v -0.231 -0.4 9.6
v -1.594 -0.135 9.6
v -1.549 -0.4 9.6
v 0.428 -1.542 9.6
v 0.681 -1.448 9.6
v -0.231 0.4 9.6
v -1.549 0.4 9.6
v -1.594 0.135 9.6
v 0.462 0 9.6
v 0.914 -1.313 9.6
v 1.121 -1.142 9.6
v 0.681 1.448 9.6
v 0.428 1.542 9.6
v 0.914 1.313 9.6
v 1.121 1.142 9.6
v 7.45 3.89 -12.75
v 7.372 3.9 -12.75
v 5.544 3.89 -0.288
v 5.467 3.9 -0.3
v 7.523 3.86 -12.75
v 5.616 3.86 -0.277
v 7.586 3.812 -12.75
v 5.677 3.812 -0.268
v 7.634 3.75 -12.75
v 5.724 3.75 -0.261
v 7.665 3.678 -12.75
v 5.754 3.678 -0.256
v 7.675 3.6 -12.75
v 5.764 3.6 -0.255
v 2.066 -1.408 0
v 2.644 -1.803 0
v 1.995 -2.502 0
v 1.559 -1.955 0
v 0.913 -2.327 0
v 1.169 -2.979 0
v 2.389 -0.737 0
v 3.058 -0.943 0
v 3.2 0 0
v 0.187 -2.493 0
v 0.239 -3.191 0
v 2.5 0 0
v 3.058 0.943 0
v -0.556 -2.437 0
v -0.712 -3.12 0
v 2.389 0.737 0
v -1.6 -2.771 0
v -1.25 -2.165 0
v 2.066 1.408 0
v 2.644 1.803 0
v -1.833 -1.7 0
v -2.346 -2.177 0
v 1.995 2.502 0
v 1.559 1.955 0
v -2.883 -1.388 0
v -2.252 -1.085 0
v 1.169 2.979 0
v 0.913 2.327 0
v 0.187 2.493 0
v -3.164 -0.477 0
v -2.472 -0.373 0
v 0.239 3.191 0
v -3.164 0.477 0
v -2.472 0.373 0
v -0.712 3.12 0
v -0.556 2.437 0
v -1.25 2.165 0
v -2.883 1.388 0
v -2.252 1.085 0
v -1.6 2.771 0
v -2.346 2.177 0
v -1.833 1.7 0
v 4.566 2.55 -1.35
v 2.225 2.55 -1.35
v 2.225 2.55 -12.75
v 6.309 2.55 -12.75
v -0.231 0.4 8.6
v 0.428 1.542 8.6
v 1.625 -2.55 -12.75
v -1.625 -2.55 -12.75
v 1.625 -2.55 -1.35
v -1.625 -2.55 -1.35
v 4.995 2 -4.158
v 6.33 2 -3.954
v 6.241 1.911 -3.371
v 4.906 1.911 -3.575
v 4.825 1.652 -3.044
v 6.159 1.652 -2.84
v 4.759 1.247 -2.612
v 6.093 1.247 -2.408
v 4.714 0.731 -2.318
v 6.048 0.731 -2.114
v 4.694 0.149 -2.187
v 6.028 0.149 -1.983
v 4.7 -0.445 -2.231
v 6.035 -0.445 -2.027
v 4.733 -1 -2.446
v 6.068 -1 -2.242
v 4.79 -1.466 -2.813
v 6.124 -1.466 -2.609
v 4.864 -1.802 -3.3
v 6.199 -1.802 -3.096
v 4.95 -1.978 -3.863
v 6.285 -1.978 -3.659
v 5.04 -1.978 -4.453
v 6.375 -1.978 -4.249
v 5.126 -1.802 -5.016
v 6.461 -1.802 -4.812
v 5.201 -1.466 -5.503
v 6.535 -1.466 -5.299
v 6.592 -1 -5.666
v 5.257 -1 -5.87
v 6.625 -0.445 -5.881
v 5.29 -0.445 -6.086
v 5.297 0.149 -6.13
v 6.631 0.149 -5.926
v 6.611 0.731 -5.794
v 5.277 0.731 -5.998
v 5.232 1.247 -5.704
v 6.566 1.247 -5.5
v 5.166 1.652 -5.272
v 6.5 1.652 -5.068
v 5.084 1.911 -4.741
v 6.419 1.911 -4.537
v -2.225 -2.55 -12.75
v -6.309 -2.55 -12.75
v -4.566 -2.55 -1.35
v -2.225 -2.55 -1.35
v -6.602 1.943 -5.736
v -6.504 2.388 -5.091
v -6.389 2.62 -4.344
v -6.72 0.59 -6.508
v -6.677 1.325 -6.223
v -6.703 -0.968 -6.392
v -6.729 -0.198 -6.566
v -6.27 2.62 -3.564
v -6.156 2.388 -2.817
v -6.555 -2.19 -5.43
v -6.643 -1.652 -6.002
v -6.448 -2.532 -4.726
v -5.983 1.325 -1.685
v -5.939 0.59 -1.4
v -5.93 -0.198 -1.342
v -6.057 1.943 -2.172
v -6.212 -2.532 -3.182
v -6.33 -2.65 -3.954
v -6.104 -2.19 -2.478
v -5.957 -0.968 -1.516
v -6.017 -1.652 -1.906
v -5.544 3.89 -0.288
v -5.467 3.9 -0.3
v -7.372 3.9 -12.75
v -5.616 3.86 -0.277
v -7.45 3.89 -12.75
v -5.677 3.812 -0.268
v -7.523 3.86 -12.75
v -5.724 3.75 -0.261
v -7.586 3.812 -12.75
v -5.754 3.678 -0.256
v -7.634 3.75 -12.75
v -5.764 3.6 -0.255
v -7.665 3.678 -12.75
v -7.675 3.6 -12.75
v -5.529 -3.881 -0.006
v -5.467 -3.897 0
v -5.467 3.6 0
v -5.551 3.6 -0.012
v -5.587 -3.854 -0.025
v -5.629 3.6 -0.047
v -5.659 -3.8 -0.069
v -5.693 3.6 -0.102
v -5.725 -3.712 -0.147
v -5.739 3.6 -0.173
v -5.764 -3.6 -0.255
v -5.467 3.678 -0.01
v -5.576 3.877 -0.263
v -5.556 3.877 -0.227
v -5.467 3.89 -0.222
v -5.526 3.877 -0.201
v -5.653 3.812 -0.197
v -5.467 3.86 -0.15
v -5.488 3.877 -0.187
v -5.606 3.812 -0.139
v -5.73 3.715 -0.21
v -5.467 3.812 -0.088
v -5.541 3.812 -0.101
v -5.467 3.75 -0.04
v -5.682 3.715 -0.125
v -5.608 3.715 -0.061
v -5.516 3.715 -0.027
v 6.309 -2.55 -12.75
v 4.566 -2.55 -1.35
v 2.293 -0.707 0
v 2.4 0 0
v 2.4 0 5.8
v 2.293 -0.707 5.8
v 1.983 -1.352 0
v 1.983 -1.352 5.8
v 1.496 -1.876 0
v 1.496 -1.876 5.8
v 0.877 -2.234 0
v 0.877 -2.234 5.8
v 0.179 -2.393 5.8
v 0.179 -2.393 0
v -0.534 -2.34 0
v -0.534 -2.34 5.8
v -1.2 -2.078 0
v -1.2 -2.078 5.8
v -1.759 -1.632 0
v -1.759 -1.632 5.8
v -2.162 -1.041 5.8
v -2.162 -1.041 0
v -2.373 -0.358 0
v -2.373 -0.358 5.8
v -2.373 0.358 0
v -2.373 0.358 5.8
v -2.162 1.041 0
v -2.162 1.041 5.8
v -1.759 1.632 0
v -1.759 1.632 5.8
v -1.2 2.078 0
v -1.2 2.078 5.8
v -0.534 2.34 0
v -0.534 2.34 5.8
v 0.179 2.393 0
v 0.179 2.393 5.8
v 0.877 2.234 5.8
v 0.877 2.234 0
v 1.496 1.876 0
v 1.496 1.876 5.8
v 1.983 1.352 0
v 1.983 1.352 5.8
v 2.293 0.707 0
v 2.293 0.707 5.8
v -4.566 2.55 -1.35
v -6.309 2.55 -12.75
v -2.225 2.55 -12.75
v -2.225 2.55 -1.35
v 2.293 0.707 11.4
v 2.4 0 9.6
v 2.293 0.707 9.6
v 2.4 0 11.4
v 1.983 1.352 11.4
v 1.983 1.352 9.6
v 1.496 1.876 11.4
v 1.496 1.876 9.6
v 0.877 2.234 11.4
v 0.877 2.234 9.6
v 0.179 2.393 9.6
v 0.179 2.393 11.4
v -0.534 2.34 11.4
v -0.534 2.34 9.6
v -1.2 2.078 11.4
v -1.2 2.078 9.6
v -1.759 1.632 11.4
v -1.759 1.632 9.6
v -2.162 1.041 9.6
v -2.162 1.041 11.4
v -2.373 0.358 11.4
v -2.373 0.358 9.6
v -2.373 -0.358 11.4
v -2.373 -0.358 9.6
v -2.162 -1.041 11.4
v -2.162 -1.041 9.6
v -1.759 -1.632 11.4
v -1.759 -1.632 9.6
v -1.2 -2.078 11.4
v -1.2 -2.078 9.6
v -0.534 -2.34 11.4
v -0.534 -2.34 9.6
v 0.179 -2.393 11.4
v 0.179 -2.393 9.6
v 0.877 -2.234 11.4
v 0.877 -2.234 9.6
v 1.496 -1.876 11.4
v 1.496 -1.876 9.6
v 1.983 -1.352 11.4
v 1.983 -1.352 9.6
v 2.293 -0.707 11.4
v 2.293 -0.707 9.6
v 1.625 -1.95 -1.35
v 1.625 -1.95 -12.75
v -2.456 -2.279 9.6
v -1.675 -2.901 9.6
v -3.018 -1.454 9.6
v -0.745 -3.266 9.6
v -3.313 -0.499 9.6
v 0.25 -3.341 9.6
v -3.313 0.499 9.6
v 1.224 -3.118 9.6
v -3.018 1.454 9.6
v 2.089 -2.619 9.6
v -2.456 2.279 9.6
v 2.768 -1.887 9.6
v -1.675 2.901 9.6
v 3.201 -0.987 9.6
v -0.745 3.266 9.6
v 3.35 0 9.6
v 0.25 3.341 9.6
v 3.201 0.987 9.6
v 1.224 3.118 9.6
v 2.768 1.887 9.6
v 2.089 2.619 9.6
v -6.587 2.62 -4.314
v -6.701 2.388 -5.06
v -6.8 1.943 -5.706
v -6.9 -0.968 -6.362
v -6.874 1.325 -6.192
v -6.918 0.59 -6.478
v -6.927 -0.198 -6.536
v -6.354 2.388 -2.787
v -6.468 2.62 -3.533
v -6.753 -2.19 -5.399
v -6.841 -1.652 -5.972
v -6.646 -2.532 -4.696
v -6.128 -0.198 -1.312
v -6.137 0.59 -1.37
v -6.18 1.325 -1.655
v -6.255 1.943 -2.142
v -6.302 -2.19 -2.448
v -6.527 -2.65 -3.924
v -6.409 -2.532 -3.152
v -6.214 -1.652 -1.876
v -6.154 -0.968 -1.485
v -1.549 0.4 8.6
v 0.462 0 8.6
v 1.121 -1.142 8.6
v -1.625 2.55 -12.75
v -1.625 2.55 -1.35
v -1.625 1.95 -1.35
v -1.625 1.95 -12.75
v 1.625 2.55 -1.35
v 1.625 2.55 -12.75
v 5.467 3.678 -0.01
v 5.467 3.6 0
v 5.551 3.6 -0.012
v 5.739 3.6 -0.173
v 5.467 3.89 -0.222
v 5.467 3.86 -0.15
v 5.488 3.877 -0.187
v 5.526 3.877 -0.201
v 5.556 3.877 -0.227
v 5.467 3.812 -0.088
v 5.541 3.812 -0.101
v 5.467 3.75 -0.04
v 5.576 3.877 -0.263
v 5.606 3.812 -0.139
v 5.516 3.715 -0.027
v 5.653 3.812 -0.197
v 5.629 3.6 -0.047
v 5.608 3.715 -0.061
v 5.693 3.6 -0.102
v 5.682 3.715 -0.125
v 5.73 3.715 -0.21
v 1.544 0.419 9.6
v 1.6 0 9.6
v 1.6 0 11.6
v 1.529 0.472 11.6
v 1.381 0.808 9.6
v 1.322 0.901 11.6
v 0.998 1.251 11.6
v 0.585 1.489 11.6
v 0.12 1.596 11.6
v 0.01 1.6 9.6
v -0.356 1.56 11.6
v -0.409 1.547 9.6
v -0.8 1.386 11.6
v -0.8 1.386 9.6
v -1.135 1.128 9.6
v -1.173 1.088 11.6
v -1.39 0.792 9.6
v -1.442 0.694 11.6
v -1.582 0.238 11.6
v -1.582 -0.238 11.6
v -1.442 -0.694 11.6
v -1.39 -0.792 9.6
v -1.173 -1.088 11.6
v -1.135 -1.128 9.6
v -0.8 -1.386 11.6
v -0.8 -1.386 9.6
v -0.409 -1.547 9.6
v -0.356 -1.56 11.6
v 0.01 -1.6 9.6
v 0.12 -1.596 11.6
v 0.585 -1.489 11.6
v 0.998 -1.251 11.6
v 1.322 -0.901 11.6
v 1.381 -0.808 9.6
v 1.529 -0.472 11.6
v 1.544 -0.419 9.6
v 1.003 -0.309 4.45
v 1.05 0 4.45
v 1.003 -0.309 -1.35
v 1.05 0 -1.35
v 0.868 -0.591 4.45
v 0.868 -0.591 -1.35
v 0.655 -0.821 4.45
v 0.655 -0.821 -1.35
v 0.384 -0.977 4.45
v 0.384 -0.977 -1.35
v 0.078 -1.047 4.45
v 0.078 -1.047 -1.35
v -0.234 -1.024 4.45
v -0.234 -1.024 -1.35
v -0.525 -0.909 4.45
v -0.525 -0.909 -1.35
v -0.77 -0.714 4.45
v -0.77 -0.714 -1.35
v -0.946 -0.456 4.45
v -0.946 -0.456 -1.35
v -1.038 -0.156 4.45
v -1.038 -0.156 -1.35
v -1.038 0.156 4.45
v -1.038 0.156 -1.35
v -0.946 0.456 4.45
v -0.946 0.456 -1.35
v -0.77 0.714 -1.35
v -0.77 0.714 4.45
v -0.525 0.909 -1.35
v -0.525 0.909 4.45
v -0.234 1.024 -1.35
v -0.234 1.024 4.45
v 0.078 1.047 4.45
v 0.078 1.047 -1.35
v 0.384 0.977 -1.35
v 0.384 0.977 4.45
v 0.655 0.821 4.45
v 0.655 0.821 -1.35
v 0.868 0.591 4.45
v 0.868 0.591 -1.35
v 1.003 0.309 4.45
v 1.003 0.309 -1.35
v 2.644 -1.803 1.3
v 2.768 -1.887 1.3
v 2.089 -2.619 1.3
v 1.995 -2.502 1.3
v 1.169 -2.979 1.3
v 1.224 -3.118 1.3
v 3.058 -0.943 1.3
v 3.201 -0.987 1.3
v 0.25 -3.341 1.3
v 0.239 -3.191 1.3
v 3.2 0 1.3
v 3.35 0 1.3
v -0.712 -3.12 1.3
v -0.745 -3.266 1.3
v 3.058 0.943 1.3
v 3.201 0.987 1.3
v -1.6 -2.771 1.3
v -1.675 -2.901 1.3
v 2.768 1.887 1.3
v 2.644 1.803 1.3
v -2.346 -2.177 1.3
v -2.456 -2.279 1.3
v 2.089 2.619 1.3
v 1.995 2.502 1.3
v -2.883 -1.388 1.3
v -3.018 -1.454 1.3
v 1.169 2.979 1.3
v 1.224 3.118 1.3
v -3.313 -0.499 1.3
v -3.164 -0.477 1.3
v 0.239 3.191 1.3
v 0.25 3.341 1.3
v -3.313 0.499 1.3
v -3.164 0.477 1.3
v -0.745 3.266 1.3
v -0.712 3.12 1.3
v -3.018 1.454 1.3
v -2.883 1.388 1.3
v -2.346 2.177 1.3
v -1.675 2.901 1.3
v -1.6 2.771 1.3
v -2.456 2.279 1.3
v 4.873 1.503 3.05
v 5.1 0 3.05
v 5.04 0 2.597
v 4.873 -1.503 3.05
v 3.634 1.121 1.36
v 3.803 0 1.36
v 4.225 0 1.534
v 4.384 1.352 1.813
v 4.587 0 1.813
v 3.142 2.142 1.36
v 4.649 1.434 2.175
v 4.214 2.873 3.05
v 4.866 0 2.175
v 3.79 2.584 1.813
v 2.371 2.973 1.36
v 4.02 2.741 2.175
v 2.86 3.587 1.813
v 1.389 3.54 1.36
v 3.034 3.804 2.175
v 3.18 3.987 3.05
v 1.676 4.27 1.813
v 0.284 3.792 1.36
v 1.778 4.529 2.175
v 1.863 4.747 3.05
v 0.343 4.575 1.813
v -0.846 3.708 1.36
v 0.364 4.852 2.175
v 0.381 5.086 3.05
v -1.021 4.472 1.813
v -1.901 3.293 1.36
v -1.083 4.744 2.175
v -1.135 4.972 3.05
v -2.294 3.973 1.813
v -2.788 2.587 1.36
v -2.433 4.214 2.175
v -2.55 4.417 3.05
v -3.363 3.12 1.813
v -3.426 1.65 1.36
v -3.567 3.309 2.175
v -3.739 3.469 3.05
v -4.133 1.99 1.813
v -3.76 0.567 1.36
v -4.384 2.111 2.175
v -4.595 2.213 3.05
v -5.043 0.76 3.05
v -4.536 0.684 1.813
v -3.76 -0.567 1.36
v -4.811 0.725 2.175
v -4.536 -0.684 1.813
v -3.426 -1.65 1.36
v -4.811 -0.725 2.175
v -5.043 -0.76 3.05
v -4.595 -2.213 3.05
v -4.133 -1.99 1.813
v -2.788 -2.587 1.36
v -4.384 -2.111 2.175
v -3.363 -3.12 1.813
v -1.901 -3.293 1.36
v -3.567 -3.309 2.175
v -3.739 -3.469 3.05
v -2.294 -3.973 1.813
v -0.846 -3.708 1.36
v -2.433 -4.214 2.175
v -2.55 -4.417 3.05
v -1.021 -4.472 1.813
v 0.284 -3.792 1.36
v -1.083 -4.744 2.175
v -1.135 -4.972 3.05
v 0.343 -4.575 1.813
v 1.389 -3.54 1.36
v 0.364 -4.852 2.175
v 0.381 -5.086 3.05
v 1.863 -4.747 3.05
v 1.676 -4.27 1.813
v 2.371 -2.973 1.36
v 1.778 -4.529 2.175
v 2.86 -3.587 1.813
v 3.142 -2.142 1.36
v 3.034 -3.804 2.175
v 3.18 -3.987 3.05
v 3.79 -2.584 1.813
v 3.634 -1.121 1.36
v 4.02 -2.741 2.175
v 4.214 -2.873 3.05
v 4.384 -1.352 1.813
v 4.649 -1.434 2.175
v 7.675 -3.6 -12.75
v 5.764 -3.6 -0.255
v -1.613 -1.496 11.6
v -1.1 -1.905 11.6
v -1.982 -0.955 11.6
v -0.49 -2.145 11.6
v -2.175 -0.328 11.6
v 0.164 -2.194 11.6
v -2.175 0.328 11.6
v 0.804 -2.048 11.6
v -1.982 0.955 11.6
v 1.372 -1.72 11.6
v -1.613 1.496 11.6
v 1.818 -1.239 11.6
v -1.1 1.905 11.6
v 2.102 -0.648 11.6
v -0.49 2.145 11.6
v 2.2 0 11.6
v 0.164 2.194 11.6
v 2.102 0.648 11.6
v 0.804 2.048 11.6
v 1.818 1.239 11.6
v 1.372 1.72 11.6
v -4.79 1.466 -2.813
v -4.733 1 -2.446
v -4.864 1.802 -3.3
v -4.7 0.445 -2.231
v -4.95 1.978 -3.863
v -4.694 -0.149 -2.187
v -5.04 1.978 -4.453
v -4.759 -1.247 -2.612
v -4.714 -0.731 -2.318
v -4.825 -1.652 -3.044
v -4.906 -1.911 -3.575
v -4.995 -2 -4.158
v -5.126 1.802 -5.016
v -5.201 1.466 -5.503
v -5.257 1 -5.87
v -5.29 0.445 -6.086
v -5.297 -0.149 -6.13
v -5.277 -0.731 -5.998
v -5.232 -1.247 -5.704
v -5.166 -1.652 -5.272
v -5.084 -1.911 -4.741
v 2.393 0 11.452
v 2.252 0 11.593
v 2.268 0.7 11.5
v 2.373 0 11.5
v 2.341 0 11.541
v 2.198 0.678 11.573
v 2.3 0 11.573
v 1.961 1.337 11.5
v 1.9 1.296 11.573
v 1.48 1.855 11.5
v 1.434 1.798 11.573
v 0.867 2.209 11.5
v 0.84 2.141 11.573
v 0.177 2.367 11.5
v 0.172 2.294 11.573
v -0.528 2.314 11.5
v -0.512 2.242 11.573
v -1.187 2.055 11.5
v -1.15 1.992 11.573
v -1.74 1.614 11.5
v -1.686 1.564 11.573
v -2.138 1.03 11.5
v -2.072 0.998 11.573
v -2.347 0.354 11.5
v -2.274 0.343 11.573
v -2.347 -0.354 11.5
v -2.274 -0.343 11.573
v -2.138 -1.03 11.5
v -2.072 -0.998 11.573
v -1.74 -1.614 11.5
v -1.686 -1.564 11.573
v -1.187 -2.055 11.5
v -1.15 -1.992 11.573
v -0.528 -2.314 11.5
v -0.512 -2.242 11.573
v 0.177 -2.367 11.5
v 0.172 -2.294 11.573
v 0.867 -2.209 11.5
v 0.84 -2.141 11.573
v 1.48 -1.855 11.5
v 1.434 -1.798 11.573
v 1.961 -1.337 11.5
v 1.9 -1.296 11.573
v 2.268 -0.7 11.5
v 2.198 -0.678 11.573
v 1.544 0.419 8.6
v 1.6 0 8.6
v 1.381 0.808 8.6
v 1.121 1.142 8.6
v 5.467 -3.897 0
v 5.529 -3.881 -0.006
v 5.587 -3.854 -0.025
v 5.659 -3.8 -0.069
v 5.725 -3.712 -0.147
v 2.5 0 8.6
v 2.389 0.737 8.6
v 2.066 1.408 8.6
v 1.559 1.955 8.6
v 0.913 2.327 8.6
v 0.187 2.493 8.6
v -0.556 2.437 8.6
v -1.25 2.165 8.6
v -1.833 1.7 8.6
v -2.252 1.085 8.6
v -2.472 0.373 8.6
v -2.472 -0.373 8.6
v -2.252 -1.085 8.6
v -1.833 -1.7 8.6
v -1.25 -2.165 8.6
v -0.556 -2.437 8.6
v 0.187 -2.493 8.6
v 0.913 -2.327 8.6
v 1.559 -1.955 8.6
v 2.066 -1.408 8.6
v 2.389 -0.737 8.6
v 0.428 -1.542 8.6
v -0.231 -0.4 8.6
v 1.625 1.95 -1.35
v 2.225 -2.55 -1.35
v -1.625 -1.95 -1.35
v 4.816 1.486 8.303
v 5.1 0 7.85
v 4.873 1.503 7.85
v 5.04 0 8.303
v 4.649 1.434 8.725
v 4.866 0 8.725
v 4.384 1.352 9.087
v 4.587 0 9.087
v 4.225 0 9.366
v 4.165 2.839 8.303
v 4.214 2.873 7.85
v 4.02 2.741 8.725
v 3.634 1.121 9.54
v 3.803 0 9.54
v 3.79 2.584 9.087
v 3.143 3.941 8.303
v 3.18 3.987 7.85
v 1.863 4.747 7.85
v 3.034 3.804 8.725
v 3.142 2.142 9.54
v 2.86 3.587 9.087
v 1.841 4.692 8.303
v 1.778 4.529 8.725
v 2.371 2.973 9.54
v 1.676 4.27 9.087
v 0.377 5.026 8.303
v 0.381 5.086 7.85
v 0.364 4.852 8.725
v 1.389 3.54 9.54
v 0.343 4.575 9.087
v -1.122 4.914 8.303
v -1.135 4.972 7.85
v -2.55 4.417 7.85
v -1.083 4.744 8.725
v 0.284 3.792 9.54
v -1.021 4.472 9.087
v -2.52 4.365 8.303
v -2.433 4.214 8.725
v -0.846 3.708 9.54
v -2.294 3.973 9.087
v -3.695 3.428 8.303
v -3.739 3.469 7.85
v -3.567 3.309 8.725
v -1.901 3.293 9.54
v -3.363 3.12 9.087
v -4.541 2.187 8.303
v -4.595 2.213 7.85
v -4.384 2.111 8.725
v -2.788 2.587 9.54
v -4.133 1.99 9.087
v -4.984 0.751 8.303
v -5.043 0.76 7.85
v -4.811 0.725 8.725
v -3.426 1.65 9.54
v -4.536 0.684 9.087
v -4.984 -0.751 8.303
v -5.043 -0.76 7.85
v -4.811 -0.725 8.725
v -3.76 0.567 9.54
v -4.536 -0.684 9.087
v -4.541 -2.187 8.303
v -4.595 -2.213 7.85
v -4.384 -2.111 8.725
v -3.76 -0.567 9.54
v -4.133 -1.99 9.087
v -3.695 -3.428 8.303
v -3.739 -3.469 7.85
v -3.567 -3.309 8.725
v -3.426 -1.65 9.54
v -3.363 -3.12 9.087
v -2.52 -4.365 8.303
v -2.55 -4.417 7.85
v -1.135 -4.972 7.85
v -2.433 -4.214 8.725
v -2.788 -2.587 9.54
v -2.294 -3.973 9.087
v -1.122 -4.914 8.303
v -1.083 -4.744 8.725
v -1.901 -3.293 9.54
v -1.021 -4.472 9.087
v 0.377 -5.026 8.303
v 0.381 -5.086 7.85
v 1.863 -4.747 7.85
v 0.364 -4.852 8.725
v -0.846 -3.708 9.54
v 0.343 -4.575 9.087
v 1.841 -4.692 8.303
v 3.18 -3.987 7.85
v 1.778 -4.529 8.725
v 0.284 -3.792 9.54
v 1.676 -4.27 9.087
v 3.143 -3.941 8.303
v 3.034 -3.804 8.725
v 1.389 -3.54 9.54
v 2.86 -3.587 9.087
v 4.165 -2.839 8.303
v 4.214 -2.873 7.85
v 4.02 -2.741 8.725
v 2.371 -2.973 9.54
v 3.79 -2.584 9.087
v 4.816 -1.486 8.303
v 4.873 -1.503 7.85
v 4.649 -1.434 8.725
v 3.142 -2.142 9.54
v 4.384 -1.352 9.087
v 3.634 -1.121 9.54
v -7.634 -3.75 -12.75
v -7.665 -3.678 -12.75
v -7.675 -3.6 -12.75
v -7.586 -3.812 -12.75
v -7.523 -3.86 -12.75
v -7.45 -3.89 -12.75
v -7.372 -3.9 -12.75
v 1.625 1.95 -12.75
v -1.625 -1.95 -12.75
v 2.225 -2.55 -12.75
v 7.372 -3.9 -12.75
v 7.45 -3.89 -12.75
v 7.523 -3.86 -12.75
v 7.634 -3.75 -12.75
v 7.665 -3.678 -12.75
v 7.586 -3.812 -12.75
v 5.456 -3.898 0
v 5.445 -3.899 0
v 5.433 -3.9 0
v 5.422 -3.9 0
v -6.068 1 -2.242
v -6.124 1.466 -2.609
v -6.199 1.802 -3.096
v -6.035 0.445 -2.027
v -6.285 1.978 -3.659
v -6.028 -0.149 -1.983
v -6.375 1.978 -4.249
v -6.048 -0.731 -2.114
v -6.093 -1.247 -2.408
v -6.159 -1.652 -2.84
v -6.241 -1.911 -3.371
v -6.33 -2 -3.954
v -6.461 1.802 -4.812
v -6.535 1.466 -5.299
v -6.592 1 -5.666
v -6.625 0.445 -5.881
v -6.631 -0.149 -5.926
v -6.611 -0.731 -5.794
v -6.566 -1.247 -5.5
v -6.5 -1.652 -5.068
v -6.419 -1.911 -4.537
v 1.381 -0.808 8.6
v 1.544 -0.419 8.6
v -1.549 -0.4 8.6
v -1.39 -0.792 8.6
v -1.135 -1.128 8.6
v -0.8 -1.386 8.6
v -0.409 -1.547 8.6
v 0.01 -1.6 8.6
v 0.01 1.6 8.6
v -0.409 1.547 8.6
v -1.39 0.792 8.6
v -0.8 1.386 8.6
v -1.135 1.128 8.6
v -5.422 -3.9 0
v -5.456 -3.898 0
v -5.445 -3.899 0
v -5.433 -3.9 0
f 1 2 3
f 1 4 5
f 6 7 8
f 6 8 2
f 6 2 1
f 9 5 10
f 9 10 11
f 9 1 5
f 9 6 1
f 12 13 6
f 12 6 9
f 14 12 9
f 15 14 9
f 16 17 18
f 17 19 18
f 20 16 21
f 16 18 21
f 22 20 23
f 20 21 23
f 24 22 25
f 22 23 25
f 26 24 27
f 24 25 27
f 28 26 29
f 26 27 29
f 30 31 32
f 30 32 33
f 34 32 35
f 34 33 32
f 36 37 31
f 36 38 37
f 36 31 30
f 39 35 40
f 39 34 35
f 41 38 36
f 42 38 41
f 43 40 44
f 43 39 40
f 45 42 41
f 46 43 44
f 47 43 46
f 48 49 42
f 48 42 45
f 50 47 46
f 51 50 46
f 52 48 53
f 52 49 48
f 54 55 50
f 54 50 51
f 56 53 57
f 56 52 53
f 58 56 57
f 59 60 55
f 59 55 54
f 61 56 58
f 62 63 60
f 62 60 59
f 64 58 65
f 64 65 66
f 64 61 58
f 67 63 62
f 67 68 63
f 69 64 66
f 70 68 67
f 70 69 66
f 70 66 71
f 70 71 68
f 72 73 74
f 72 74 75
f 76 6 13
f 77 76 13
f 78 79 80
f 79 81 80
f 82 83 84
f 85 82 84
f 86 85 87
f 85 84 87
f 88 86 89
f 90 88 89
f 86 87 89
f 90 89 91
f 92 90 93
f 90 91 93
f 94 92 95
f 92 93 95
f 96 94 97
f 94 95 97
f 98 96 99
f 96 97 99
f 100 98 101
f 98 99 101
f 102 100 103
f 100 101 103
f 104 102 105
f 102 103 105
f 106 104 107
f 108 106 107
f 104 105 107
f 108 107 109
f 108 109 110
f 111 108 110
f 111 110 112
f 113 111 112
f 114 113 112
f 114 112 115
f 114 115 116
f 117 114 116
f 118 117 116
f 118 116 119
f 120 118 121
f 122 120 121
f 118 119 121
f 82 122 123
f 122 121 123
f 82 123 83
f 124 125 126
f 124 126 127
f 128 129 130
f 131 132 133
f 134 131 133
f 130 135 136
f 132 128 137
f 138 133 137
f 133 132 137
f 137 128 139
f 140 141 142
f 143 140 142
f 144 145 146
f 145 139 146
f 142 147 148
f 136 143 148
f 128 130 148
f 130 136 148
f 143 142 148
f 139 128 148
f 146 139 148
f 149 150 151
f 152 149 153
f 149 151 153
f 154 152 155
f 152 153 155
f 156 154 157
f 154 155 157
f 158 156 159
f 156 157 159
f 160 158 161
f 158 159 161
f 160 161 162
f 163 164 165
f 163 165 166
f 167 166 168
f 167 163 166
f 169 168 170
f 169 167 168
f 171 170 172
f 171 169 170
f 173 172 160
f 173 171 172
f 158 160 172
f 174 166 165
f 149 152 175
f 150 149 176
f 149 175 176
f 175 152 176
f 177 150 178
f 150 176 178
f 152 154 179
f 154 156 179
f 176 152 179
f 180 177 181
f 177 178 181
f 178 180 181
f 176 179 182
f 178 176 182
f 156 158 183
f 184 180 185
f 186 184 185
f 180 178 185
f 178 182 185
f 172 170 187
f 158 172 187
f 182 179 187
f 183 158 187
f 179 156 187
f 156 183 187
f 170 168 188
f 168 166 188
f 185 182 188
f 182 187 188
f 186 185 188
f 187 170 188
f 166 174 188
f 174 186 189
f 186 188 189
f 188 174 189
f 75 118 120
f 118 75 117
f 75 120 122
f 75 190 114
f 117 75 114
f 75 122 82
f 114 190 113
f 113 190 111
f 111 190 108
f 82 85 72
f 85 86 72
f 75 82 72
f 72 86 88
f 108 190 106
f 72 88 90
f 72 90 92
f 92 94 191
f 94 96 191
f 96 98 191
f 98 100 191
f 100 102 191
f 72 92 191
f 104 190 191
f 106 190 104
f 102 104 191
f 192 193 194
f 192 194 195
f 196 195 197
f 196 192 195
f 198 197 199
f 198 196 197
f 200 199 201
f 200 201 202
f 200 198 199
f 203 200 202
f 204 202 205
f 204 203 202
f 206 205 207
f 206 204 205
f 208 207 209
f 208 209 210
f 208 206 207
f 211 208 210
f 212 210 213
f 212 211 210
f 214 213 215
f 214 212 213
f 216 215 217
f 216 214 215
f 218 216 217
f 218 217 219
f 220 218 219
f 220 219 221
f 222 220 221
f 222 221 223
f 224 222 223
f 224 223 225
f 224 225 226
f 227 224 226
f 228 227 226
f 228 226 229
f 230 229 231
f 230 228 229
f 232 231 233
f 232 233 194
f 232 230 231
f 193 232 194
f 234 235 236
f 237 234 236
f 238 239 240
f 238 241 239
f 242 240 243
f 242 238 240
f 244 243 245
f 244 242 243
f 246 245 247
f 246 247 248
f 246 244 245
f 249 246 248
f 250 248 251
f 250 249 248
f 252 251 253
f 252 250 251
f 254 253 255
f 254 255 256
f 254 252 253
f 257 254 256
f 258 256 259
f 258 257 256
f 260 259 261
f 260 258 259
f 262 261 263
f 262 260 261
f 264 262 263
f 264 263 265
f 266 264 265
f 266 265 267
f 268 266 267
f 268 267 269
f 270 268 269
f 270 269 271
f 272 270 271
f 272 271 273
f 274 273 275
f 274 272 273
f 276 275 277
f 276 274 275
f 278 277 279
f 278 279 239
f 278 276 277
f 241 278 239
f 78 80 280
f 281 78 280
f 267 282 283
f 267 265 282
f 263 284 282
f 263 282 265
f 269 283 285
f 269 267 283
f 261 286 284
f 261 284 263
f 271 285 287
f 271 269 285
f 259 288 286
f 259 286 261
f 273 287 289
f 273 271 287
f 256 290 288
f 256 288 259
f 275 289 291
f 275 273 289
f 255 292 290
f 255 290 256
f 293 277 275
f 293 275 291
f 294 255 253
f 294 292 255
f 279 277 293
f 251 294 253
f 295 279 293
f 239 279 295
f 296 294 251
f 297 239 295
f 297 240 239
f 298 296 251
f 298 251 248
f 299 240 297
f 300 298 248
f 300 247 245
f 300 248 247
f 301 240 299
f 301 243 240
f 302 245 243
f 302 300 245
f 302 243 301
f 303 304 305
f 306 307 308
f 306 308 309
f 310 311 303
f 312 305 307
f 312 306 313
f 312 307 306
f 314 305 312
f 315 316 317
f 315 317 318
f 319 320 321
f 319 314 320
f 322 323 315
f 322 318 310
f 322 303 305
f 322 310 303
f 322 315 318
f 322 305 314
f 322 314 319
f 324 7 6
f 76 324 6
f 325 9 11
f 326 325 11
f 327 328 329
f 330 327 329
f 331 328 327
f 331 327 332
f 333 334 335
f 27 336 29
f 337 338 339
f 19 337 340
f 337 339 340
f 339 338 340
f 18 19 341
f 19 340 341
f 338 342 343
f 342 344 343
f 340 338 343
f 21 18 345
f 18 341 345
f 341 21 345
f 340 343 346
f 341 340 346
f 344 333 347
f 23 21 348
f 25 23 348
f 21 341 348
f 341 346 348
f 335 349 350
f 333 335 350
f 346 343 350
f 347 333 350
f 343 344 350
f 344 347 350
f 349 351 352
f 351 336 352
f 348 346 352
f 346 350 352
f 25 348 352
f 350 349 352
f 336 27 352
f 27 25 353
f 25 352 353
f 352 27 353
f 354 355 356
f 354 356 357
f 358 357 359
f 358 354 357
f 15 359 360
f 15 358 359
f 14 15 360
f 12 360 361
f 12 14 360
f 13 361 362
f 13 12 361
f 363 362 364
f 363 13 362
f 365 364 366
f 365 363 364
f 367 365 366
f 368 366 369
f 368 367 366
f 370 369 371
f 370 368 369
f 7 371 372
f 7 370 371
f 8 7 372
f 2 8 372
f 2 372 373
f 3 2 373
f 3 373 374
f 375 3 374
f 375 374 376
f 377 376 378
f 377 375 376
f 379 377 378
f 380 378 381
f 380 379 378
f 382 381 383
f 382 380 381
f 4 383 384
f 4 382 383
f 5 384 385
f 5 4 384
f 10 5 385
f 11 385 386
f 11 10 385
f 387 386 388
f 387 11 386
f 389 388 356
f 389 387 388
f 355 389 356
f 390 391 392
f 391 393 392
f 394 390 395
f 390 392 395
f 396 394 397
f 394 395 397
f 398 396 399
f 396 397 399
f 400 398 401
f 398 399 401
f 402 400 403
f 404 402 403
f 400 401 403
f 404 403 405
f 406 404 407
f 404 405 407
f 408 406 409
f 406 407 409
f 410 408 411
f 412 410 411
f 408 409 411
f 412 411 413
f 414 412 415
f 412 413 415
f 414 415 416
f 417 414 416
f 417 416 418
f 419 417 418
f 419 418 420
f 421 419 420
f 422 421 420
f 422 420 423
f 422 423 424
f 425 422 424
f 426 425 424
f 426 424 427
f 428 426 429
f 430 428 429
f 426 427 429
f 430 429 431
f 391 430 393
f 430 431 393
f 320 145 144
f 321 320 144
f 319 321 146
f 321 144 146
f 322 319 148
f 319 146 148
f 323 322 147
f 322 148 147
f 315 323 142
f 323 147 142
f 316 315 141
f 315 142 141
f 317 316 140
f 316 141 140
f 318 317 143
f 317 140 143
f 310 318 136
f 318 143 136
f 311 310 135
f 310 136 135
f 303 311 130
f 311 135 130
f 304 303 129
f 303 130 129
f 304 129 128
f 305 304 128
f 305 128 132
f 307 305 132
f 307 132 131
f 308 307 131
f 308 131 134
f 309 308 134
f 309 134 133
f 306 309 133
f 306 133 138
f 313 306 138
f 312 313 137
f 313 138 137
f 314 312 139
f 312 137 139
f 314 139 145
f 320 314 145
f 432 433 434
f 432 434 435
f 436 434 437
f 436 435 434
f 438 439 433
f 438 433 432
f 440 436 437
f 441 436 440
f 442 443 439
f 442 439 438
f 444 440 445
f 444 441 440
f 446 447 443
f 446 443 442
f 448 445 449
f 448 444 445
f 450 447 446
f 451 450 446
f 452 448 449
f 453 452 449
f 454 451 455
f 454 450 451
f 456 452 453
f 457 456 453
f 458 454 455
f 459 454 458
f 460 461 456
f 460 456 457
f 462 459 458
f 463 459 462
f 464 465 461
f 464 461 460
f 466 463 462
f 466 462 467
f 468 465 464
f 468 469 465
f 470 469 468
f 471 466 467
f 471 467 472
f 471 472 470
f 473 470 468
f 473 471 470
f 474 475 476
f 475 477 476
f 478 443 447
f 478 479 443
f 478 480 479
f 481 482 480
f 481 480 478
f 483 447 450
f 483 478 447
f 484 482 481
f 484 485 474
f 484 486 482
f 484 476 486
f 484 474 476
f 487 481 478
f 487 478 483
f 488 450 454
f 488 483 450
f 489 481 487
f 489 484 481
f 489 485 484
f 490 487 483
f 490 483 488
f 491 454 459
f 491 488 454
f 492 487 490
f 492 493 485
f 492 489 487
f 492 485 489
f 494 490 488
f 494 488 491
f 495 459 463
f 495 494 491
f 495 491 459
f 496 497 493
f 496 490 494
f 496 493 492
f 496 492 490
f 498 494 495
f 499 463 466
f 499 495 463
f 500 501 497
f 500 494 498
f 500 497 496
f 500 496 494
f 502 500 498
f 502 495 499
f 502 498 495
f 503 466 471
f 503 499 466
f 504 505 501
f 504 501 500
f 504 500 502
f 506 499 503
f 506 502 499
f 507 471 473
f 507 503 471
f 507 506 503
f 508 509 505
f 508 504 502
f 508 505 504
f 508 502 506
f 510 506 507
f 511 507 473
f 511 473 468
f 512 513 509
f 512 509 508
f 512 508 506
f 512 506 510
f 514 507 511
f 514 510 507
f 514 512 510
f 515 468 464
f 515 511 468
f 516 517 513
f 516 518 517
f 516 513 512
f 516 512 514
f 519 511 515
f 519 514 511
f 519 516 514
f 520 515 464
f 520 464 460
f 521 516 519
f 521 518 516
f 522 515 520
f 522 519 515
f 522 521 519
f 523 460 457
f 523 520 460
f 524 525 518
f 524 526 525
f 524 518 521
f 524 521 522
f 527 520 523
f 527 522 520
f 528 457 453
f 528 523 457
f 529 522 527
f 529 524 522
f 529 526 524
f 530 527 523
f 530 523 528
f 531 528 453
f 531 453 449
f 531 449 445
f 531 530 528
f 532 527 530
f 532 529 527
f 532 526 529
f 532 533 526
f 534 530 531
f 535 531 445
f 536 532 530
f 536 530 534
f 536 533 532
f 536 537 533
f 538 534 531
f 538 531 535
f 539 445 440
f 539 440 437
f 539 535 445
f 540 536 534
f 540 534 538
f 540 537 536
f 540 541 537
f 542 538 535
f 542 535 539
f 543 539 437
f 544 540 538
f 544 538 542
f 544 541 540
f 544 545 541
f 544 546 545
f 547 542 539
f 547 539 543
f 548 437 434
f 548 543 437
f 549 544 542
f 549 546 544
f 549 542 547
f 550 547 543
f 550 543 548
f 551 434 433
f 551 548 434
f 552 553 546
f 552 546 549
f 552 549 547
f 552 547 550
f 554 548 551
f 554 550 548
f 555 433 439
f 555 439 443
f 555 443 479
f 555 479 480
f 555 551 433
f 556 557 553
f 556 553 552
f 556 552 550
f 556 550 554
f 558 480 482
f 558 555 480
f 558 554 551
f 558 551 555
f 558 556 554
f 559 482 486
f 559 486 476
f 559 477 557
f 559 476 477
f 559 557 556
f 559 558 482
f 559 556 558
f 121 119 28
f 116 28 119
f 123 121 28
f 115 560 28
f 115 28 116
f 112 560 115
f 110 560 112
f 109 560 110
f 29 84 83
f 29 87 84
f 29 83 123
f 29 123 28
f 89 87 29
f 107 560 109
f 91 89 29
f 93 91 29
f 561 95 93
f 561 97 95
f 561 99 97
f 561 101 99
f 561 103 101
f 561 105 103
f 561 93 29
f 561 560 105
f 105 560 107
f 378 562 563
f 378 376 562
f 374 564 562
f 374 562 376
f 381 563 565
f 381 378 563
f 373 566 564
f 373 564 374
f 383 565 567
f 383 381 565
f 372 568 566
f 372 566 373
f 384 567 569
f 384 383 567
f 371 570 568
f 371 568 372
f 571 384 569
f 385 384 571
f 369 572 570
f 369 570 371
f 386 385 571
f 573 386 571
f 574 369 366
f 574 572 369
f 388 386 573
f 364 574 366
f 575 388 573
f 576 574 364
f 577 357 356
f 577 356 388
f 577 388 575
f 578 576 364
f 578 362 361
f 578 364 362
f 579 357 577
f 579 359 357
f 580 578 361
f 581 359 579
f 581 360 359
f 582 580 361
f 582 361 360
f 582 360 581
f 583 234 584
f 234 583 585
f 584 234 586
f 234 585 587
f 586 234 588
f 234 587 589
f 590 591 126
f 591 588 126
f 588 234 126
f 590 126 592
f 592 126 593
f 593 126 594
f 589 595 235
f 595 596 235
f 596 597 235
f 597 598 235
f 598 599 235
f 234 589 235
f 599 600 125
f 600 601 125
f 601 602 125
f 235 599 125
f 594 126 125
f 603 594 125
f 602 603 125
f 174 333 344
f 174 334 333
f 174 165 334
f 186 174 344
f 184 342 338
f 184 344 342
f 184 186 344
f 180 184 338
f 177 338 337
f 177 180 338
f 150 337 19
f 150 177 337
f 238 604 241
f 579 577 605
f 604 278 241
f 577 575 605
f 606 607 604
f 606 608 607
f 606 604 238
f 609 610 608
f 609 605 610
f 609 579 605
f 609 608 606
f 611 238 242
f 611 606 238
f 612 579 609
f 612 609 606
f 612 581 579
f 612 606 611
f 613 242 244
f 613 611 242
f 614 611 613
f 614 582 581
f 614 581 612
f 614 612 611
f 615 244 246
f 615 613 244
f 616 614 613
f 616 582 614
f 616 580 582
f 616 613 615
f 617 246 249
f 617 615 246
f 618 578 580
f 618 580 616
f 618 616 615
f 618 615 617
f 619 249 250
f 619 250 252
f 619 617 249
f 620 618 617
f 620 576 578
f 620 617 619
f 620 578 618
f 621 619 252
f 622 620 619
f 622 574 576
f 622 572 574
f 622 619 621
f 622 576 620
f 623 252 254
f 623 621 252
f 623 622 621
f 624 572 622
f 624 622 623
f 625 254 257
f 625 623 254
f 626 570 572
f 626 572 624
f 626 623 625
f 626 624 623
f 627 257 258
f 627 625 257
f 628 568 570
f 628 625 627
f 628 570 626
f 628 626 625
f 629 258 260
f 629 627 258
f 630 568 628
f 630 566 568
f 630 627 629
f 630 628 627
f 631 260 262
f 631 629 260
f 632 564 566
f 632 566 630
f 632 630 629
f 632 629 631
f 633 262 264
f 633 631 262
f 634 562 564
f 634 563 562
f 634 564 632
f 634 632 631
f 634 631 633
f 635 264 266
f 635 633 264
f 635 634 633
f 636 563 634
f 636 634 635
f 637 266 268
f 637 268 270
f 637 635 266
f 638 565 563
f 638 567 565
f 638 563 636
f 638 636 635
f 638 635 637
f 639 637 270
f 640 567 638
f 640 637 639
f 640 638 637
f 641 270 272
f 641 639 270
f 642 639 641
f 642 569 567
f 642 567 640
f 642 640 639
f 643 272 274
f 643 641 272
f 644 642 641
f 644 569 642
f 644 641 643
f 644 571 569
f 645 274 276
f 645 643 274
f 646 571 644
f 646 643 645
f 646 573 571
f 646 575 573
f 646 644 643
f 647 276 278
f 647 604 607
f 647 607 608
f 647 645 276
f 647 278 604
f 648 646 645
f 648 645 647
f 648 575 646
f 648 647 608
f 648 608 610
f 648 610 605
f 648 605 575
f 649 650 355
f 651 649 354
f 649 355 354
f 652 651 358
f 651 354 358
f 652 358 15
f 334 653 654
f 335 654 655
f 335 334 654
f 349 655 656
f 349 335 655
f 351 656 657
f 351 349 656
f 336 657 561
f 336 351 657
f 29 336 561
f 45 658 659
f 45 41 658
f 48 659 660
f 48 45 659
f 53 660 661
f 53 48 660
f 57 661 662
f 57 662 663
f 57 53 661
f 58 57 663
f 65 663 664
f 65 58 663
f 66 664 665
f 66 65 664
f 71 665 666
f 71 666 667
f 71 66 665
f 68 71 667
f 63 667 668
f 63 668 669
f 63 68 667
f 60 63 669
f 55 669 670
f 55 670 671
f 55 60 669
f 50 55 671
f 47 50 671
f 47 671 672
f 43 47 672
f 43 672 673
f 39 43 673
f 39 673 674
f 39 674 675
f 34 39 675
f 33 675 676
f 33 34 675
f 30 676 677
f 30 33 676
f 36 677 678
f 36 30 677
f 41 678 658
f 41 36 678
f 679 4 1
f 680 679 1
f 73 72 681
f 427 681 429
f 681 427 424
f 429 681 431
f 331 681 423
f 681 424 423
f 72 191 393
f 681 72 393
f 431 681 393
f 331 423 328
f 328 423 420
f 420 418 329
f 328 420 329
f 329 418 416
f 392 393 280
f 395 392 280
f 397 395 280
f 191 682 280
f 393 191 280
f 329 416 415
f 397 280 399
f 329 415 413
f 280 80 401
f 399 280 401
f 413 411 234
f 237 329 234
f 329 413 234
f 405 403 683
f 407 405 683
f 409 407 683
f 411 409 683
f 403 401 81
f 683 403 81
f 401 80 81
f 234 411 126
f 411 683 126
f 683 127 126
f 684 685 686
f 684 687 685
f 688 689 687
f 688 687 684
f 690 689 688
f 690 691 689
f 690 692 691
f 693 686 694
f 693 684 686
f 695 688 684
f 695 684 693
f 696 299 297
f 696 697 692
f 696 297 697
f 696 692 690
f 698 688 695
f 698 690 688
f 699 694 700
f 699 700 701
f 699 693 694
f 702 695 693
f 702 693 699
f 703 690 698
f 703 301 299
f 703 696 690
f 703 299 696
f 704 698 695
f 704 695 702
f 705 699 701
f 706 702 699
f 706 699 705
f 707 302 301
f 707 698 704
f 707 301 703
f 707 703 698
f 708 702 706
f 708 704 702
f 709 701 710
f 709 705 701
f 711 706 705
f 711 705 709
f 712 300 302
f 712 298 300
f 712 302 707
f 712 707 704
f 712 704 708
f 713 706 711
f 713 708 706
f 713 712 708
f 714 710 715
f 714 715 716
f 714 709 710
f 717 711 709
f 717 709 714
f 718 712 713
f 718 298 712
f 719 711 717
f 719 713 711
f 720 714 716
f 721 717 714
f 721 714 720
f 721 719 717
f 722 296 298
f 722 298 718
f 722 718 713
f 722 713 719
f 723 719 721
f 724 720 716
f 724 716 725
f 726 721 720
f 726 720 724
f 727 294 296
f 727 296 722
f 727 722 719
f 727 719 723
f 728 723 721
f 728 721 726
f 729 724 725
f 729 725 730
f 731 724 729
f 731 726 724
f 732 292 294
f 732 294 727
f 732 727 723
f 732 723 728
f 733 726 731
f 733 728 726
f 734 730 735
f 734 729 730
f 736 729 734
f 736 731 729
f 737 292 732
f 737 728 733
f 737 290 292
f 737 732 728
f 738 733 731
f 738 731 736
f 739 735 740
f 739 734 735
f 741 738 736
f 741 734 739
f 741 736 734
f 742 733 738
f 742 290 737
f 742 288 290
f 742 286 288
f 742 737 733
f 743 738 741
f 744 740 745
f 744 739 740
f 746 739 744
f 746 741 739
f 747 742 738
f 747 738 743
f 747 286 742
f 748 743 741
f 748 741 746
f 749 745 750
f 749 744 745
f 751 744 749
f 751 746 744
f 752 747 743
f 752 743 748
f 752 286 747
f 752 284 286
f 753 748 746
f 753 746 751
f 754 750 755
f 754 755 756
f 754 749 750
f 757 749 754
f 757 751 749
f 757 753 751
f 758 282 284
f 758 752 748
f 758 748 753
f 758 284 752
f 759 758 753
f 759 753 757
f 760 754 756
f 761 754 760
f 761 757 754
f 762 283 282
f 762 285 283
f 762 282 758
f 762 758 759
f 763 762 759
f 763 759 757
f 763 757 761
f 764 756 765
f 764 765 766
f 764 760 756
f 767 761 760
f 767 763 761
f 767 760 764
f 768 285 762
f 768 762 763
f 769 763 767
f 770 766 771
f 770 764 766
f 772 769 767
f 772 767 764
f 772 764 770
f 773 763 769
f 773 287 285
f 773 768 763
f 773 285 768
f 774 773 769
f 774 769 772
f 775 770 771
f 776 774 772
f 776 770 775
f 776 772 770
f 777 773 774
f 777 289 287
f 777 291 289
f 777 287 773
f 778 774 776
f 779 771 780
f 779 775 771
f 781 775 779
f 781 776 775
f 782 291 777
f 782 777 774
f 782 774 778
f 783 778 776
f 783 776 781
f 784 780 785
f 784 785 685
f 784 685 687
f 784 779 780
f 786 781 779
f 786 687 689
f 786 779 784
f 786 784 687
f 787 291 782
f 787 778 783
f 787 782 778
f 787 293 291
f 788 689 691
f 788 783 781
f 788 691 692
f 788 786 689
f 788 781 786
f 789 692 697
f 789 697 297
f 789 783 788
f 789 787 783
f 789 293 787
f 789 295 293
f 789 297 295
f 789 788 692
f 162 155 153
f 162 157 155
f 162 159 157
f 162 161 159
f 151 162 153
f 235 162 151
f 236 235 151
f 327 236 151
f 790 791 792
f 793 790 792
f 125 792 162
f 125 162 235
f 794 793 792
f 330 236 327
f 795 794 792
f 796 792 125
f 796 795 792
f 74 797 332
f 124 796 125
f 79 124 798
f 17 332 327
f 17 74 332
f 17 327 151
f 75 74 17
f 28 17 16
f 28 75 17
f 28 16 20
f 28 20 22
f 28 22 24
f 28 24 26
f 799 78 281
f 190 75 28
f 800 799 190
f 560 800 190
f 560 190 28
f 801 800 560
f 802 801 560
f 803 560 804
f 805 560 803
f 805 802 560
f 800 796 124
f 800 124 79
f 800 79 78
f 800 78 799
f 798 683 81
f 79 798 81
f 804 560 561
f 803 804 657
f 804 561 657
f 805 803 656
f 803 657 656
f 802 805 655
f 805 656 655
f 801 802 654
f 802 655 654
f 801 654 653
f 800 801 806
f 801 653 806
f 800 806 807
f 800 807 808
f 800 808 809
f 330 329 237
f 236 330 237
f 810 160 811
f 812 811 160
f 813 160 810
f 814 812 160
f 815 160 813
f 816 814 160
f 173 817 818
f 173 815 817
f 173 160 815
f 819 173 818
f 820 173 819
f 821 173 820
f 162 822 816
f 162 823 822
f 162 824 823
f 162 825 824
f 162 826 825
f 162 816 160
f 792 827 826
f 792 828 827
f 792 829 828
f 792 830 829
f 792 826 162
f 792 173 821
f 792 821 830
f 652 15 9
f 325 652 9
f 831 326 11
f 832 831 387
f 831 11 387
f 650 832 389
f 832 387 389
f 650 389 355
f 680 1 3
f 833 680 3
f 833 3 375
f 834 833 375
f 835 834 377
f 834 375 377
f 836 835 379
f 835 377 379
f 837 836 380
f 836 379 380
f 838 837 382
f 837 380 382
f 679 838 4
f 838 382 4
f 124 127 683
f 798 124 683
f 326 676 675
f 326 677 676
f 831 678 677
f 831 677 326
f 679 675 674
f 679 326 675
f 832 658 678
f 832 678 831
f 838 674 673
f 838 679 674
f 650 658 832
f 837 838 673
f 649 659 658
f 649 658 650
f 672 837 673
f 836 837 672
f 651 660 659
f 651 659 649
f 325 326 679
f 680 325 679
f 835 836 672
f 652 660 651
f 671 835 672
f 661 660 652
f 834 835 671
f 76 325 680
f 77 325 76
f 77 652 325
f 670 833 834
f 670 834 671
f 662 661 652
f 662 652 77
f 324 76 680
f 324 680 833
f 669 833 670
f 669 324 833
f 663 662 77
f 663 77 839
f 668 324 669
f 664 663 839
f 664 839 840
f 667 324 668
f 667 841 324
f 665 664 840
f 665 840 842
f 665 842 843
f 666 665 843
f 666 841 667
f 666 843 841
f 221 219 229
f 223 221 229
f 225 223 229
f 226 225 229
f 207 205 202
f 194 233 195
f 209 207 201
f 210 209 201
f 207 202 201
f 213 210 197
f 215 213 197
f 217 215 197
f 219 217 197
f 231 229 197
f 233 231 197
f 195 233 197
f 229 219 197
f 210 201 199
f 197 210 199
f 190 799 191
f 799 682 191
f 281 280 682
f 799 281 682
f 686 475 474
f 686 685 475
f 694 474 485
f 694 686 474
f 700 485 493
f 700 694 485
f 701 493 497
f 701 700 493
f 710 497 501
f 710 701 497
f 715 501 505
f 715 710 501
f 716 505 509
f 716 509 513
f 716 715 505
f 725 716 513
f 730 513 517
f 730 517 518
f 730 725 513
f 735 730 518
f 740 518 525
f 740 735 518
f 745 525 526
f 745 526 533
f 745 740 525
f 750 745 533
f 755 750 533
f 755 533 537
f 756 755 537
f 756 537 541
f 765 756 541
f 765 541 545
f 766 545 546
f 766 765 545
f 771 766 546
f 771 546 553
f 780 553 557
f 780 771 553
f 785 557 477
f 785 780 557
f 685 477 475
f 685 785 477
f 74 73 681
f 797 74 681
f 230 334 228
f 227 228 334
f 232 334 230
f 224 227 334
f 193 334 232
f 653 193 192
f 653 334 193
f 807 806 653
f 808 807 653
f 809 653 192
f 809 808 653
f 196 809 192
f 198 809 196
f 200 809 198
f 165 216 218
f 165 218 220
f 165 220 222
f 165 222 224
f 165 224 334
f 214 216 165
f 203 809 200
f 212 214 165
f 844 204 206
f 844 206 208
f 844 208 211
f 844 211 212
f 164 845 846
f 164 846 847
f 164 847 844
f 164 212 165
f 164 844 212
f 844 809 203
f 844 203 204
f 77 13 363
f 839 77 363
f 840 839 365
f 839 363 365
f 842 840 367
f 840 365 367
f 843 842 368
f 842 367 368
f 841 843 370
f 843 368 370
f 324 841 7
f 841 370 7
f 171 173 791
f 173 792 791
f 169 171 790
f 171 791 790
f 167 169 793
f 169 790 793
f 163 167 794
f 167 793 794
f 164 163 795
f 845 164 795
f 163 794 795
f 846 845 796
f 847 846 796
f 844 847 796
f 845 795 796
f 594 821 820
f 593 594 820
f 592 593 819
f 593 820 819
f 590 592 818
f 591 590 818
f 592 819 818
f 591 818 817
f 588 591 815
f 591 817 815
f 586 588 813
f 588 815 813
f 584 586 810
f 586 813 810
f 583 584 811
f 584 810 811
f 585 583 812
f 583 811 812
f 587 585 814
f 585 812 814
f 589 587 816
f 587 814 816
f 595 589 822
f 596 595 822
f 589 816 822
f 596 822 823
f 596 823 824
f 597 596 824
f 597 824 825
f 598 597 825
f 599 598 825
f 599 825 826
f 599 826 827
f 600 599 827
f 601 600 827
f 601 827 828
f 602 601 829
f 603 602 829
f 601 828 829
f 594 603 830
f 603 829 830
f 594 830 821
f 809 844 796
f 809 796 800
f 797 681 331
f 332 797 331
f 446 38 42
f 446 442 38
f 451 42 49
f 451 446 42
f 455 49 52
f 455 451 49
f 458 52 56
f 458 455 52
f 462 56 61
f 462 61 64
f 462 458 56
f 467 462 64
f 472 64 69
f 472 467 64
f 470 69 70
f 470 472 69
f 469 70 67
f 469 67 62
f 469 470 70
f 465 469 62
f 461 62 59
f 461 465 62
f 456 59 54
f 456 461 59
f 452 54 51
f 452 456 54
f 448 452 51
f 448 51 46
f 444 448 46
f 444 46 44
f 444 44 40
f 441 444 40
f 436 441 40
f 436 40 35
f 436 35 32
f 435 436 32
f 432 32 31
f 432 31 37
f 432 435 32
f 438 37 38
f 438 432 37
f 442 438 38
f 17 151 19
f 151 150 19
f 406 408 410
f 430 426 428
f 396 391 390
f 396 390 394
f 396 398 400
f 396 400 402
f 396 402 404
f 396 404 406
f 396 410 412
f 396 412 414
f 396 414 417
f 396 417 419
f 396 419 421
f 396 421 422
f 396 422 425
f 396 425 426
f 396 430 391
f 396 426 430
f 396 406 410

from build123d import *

# Parameters (mm, degrees)
F3_DEPTH  = 5
F4_R      = 2.4
F5_DEPTH  = 5.8
F7_DEPTH  = 3.9
F8_T      = -1.35
F11_DEPTH = 11.4
F10_R     = 2
F13_DEPTH = 1.35
F12_R     = 2
F14_DEPTH = 1.35
F15_R     = 0.3
F16_R     = 2.65
F17_DEPTH = 0.2


with BuildPart() as f1:
    # F0 (on Front) → F1 (revolve)
    with BuildSketch(Plane.XZ):
        with BuildLine():
            Line((2.5, 8.6), (2.5, 0))
            Line((2.5, 0), (3.2, 0))
            Line((3.2, 0), (3.2, 1.3))
            Line((3.2, 1.3), (3.35, 1.3))
            ThreePointArc((3.35, 1.3), (4.5874368671, 1.8125631329), (5.1, 3.05))
            Line((5.1, 3.05), (5.1, 7.85))
            ThreePointArc((5.1, 7.85), (4.5874368671, 9.0874368671), (3.35, 9.6))
            Line((3.35, 9.6), (2.4, 9.6))
            Line((2.4, 9.6), (2.4, 11.4))
            ThreePointArc((2.4, 11.4), (2.3414213562, 11.5414213562), (2.2, 11.6))
            Line((2.2, 11.6), (1.6, 11.6))
            Line((1.6, 11.6), (1.6, 9.6))
            Line((1.6, 9.6), (0, 9.6))
            Line((0, 9.6), (0, 8.6))
            Line((0, 8.6), (2.5, 8.6))
        make_face()
    revolve(axis=Axis((0, 0, 5.8), (0, 0, 1)))

    # F2 (on face) → F3 (cut)
    with BuildSketch(Plane.XY.offset(9.6)):
        with BuildLine():
            Line((-1.5491933385, 0.4), (-0.2309401077, 0.4))
            Line((-0.2309401077, 0.4), (0.4281865077, 1.5416407865))
            ThreePointArc((0.4281865077, 1.5416407865), (-0.8, 1.3856406461), (-1.5491933385, 0.4))
        make_face()
        with BuildLine():
            Line((0.4281865077, -1.5416407865), (-0.2309401077, -0.4))
            Line((-0.2309401077, -0.4), (-1.5491933385, -0.4))
            ThreePointArc((-1.5491933385, -0.4), (-0.8, -1.3856406461), (0.4281865077, -1.5416407865))
        make_face()
        with BuildLine():
            Line((1.1210068308, 1.1416407865), (0.4618802154, 0))
            Line((0.4618802154, 0), (1.1210068308, -1.1416407865))
            ThreePointArc((1.1210068308, -1.1416407865), (1.4754001032, -0.6190270878), (1.6, 0))
            ThreePointArc((1.6, 0), (1.4754001032, 0.6190270878), (1.1210068308, 1.1416407865))
        make_face()
    extrude(amount=-F3_DEPTH, mode=Mode.SUBTRACT)


with BuildPart() as f5:
    # F4 (on face) → F5 (new body)
    with BuildSketch(Plane(origin=(0, 0, 0), x_dir=(1, 0, 0), z_dir=(0, 0, -1))):
        Circle(F4_R)
    extrude(amount=-F5_DEPTH)

    # F6 (on Front) → F7 (join, symmetric)
    with BuildSketch(Plane.XZ):
        Polygon((5.725, 0), (-5.725, 0), (-7.675, -12.75), (7.675, -12.75), align=None)
    extrude(amount=F7_DEPTH, both=True)

    # F8
    f8_openings = [f5.faces().sort_by_distance(p)[0] for p in [
        (0, 0, -12.75),
    ]]
    offset(amount=F8_T, openings=f8_openings, kind=Kind.INTERSECTION)

    # F9 (on face) → F11 (join, through all)
    with BuildSketch(Plane(origin=(0, 0, -1.35), x_dir=(1, 0, 0), z_dir=(0, 0, -1))):
        Polygon((-1.625, 1.95), (-1.625, 2.55), (-2.225, 2.55), align=None)
        Polygon((2.225, 2.55), (1.625, 2.55), (1.625, 1.95), align=None)
        Polygon((1.625, -2.55), (2.225, -2.55), (1.625, -1.95), align=None)
        Polygon((-1.625, -1.95), (-2.225, -2.55), (-1.625, -2.55), align=None)
    extrude(amount=F11_DEPTH)

    # F10 (on face) → F13 (cut)
    with BuildSketch(Plane(origin=(5.5941472816, 0, 0.8555754666), x_dir=(0, 1, 0), z_dir=(0.9885057562, 0, 0.1511832333))):
        with Locations((0, -4.8655240106)):
            Circle(F10_R)
    extrude(amount=-F13_DEPTH, mode=Mode.SUBTRACT)

    # F12 (on face) → F14 (cut)
    with BuildSketch(Plane(origin=(-5.5941472816, 0, 0.8555754666), x_dir=(0, -1, 0), z_dir=(-0.9885057562, 0, 0.1511832333))):
        with Locations((0, -4.8655240106)):
            Circle(F12_R)
    extrude(amount=-F14_DEPTH, mode=Mode.SUBTRACT)

    # F15
    f15_edges = [f5.edges().sort_by_distance(p)[0] for p in [
        (-6.7, -3.9, -6.375),
        (-5.725, 0, 0),
        (-6.7, 3.9, -6.375),
        (0, 3.9, 0),
        (6.7, 3.9, -6.375),
        (5.725, 0, 0),
        (6.7, -3.9, -6.375),
    ]]
    fillet(f15_edges, radius=F15_R)


with BuildPart() as f17:
    # F16 (on face) → F17 (new body)
    with BuildSketch(Plane(origin=(-5.5941472816, 0, 0.8555754666), x_dir=(0, -1, 0), z_dir=(-0.9885057562, 0, 0.1511832333))):
        with Locations((0, -4.8655240106)):
            Circle(F16_R)
    extrude(amount=F17_DEPTH)


solid = Compound([f1.part, f5.part, f17.part])
